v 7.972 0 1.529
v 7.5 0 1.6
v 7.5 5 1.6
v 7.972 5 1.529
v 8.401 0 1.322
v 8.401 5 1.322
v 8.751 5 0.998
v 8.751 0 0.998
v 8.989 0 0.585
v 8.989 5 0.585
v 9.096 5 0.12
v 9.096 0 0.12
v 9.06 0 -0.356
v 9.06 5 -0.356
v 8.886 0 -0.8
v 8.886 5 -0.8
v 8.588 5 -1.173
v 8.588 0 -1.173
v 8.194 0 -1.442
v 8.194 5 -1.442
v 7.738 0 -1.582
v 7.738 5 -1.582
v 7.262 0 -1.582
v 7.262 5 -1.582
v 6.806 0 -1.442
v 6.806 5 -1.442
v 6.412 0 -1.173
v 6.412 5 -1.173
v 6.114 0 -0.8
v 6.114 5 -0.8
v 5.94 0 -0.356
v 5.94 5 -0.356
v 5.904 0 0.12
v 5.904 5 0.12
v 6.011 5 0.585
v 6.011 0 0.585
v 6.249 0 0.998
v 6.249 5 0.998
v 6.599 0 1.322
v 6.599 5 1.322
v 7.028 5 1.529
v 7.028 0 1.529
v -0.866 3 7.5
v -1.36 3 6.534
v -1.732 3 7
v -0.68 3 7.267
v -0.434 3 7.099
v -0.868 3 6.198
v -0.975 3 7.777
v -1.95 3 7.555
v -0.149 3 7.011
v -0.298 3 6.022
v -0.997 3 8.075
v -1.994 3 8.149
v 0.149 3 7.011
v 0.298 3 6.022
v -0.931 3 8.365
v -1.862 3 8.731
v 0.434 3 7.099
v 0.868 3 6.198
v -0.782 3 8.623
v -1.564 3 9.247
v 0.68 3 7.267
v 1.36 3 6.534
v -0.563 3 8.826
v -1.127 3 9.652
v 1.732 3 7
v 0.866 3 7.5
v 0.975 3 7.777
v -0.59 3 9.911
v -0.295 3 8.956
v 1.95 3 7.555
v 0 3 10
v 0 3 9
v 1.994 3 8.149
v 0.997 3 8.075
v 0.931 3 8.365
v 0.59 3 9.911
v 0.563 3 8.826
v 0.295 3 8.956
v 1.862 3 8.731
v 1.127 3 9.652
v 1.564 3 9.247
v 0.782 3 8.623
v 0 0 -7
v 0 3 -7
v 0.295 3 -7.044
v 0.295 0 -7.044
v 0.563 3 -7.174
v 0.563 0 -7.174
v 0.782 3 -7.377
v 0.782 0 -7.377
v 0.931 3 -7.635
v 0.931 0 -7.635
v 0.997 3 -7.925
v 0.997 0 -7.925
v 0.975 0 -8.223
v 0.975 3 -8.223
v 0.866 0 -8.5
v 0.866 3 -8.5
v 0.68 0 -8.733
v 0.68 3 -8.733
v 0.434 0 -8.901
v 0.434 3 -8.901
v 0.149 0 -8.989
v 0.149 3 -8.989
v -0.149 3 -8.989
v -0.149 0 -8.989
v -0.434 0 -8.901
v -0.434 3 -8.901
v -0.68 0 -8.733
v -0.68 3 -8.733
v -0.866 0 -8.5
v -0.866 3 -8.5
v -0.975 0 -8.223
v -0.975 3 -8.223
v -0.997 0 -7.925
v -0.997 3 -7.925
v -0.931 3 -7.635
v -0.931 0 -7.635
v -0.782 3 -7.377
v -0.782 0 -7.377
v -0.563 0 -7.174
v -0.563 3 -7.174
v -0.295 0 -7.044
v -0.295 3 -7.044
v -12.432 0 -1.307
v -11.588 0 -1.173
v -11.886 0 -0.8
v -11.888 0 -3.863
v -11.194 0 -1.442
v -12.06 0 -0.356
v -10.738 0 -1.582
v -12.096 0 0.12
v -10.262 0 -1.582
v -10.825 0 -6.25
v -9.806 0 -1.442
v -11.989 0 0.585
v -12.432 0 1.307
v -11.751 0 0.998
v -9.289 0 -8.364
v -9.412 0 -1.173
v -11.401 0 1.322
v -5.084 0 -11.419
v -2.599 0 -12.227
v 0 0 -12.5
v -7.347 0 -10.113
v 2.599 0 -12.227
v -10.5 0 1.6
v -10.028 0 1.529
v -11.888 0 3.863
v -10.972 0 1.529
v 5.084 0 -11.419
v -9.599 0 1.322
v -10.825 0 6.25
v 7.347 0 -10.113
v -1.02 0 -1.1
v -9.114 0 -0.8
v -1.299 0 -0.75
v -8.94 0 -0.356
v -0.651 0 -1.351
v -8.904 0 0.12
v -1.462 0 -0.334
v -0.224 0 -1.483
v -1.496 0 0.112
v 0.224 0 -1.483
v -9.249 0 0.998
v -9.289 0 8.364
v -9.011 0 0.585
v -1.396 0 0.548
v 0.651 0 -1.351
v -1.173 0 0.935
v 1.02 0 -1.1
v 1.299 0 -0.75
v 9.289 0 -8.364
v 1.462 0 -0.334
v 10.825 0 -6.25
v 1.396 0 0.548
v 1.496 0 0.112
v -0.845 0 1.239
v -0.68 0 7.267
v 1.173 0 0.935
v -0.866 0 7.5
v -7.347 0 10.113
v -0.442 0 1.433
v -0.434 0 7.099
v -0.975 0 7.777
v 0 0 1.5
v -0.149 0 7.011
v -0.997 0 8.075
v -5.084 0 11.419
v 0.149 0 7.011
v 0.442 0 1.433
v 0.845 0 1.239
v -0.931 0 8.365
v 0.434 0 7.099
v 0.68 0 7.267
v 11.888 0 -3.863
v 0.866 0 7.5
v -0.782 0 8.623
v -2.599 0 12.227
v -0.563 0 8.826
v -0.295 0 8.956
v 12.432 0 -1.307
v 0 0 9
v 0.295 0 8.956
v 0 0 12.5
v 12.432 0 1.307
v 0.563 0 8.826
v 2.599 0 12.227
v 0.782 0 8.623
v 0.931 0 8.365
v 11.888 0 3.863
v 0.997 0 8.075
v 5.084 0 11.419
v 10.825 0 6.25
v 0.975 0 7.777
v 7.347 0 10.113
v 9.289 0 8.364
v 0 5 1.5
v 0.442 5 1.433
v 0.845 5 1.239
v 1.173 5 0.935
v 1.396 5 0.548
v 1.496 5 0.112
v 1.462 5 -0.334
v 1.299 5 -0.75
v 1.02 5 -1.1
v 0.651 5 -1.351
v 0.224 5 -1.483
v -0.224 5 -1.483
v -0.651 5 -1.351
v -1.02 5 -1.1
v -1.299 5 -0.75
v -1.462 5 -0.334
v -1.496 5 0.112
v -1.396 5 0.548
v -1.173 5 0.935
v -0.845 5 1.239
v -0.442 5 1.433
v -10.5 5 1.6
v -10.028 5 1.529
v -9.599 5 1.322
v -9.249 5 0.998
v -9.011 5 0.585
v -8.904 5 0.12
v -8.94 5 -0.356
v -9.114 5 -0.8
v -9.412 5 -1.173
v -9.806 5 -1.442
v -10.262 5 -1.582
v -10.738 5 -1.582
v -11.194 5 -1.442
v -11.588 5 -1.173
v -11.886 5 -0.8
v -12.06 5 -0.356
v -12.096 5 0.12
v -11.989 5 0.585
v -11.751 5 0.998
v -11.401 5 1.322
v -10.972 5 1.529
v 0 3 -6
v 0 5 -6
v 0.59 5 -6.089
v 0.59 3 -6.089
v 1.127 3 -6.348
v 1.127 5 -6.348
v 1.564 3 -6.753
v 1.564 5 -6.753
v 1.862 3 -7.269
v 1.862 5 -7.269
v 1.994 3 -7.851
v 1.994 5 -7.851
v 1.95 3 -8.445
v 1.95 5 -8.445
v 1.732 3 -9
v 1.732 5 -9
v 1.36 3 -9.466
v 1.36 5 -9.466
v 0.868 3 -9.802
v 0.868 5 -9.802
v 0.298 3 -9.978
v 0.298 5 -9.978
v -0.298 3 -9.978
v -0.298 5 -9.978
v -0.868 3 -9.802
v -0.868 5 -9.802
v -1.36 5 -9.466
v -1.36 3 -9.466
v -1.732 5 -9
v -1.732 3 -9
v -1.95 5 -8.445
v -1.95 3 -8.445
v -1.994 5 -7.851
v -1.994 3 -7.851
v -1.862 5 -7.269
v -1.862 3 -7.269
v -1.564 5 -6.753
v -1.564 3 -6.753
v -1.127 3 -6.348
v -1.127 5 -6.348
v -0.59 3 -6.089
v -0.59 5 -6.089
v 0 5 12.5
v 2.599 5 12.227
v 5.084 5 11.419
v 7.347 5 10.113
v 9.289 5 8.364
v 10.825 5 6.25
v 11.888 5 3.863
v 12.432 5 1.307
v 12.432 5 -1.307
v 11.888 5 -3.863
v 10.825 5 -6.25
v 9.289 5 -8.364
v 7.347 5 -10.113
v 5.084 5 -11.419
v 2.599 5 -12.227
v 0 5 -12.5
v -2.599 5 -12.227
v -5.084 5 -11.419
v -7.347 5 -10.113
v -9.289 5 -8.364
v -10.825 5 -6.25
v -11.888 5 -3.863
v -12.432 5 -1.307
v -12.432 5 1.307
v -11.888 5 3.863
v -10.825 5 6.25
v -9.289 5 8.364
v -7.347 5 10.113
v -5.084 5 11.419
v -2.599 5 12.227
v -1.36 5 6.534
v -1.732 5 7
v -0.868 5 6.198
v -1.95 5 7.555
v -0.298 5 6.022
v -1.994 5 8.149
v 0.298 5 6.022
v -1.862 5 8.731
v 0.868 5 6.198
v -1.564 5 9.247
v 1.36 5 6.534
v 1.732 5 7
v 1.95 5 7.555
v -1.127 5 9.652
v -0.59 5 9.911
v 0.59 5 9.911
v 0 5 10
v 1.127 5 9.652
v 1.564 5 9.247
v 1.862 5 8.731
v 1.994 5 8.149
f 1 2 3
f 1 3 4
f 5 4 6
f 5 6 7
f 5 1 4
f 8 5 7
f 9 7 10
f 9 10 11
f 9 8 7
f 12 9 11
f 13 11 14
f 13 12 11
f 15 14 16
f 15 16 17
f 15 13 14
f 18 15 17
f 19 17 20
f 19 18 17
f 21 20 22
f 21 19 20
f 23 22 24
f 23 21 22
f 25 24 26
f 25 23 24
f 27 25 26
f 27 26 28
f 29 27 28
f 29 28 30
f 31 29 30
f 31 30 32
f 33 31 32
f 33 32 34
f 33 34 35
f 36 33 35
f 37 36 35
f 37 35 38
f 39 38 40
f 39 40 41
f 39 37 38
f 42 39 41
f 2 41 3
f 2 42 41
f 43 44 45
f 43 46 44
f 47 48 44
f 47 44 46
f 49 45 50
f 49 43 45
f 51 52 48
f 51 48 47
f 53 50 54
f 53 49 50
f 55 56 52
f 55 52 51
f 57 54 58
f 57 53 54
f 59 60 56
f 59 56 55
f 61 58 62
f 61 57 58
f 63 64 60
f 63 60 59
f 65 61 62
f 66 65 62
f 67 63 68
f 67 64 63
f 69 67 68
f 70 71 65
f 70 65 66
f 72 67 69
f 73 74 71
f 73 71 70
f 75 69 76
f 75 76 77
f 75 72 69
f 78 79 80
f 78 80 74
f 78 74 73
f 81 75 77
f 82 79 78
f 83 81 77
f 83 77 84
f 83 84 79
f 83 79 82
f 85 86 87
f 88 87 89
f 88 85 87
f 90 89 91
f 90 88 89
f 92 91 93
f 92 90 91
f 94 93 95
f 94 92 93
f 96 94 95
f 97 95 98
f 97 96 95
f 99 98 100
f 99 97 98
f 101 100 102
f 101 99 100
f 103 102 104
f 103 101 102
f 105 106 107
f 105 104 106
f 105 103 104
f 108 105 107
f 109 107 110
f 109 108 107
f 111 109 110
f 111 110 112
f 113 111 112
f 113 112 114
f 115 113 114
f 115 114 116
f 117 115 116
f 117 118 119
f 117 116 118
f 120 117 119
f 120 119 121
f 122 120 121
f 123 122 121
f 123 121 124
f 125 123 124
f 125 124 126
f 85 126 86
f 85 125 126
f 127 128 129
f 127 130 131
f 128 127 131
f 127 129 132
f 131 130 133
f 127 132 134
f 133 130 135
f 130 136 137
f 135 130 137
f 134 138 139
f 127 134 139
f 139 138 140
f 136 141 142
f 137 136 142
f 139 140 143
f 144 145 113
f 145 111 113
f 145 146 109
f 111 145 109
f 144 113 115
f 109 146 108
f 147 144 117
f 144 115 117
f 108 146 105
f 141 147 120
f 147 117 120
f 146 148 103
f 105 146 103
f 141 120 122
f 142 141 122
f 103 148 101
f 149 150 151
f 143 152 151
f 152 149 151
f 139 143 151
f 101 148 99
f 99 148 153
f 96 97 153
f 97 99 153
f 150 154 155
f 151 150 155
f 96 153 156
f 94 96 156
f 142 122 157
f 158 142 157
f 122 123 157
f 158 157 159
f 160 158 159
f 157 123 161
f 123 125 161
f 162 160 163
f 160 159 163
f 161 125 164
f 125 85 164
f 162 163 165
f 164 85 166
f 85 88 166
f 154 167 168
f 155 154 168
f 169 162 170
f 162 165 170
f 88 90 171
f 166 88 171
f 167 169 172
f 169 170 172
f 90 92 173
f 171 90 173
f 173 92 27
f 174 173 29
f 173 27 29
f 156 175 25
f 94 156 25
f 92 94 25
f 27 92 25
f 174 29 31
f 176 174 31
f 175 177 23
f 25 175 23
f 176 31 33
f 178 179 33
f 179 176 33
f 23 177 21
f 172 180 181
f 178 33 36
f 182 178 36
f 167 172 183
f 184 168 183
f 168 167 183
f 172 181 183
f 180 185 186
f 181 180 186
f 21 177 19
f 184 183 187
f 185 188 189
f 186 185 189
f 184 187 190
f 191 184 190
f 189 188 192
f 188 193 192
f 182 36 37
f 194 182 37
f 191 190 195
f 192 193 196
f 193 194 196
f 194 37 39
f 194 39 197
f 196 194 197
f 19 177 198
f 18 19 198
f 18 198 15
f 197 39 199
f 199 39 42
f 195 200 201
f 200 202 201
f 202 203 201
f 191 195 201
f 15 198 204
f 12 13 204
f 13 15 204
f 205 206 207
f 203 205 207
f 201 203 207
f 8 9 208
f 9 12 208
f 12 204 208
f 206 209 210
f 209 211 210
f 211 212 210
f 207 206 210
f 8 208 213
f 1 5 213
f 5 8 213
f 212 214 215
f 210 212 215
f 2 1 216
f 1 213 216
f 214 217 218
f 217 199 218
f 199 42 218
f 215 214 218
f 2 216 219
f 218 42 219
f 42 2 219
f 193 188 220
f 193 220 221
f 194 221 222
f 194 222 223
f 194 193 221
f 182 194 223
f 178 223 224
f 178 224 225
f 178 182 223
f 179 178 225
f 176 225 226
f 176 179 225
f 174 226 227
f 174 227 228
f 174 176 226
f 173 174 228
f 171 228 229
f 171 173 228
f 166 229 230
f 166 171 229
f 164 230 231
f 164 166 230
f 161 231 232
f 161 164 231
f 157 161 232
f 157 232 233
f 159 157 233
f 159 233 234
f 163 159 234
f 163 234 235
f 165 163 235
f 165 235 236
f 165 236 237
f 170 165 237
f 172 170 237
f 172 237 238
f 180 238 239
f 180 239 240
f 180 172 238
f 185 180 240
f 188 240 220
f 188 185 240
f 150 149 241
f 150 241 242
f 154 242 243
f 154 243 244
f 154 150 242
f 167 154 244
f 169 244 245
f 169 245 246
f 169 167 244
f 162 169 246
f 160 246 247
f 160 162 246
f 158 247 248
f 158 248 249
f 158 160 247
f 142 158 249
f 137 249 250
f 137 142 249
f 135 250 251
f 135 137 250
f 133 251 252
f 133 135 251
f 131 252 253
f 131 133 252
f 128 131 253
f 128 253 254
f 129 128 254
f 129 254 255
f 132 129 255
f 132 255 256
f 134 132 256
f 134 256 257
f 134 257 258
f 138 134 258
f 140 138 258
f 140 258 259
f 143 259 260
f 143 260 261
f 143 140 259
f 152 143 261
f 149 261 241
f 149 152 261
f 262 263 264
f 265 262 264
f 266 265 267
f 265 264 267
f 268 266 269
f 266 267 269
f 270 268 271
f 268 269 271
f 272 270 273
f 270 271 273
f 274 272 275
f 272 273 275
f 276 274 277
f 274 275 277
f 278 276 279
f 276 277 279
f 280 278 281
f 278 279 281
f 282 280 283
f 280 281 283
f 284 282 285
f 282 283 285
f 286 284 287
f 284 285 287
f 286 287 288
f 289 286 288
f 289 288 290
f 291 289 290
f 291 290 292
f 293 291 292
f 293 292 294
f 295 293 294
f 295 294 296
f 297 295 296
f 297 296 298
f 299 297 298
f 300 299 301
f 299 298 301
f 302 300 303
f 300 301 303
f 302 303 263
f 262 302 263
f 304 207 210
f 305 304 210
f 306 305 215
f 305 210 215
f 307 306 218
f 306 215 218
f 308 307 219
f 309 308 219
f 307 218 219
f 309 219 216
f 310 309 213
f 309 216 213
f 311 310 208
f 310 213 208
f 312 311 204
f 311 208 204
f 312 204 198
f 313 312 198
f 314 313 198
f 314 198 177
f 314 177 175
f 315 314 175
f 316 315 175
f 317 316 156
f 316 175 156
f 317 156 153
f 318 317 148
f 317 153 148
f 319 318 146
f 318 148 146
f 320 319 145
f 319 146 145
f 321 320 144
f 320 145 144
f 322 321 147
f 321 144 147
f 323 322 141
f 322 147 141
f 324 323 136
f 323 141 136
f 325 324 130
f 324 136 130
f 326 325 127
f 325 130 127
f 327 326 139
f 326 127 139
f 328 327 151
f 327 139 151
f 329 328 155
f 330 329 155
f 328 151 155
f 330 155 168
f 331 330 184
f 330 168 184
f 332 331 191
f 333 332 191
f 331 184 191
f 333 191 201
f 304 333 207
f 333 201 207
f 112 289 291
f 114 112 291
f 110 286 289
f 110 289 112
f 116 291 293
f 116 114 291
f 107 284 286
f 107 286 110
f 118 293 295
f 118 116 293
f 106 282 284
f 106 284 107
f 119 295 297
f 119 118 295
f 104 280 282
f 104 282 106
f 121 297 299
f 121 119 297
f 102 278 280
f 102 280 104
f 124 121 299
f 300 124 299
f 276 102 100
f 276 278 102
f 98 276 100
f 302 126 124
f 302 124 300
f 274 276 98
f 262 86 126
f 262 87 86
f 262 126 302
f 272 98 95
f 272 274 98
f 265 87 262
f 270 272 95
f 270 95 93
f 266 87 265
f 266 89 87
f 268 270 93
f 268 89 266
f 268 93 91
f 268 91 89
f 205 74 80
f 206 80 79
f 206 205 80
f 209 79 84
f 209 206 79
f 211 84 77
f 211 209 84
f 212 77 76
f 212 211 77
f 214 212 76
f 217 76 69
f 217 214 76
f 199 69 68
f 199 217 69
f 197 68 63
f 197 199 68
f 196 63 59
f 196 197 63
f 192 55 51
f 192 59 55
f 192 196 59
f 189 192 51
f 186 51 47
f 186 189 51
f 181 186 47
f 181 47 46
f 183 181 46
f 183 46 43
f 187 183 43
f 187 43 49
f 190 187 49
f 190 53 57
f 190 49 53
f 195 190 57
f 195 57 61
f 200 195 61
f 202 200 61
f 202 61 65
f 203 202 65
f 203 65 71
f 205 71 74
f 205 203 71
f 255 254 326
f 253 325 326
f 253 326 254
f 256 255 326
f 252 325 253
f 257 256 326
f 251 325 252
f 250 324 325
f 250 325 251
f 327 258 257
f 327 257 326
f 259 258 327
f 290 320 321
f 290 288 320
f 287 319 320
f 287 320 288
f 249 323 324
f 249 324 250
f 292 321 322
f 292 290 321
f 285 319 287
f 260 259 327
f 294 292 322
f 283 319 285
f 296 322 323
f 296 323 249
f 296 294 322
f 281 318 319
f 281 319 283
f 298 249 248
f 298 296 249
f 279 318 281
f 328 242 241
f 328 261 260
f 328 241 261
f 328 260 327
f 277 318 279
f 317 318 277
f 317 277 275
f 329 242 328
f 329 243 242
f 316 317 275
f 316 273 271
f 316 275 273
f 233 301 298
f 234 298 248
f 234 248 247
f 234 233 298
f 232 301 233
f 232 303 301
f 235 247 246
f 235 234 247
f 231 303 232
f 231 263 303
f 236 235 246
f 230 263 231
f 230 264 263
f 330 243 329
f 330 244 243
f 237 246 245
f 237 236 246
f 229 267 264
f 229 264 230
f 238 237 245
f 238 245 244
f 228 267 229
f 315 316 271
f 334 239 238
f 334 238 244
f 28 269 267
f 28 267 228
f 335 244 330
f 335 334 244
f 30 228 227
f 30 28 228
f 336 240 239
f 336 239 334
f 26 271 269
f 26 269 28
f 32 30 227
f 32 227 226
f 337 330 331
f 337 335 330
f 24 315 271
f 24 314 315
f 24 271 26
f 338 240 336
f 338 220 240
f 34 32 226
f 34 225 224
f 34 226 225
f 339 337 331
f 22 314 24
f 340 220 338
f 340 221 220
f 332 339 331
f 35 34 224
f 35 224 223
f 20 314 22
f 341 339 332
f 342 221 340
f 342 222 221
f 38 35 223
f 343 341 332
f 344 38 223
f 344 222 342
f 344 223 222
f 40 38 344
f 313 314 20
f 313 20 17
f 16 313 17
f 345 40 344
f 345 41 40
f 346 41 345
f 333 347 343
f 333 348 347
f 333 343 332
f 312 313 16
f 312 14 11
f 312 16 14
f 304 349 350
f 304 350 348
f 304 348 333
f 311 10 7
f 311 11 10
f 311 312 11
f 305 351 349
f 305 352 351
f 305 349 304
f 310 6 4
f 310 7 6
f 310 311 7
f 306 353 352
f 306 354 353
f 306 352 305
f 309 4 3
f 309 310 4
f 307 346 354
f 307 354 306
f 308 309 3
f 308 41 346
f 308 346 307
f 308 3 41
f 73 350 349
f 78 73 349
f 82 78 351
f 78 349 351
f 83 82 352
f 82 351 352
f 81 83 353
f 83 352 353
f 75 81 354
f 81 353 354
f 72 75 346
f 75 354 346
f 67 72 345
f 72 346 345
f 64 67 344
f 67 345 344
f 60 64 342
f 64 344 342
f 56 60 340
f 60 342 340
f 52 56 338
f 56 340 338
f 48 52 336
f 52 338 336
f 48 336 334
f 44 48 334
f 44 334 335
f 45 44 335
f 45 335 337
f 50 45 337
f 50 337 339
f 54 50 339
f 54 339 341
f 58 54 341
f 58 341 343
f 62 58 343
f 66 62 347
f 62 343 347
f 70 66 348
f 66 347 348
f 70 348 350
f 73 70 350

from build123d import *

# Parameters (mm, degrees)
SKETCH1_R           = 12.5
SKETCH1_R_2         = 1
SKETCH1_R_3         = 1.5
SKETCH1_R_4         = 1.6
BOSS_EXTRUDE1_DEPTH = 5
SKETCH2_R           = 2
CUT_EXTRUDE1_DEPTH  = 2


with BuildPart() as part:
    # Sketch1 → Boss-Extrude1 (new body)
    with BuildSketch(Plane(origin=(0, 0, 0), x_dir=(1, 0, 0), z_dir=(0, 1, 0))):
        with Locations(Location((0, 0, 0), (0, 0, 270))):
            Circle(SKETCH1_R)
        with Locations(Location((0, -8, 0), (0, 0, 270))):
            Circle(SKETCH1_R_2, mode=Mode.SUBTRACT)
        with Locations(Location((0, 8, 0), (0, 0, 270))):
            Circle(SKETCH1_R_2, mode=Mode.SUBTRACT)
        with Locations(Location((0, 0, 0), (0, 0, 270))):
            Circle(SKETCH1_R_3, mode=Mode.SUBTRACT)
        with Locations(Location((-10.5, 0, 0), (0, 0, 270))):
            Circle(SKETCH1_R_4, mode=Mode.SUBTRACT)
        with Locations(Location((7.5, 0, 0), (0, 0, 270))):
            Circle(SKETCH1_R_4, mode=Mode.SUBTRACT)
    extrude(amount=BOSS_EXTRUDE1_DEPTH)

    # Sketch2 → Cut-Extrude1 (cut)
    with BuildSketch(Plane(origin=(0, 5, 0), x_dir=(1, 0, 0), z_dir=(0, 1, 0))):
        with Locations(Location((0, 8, 0), (0, 0, 270))):
            Circle(SKETCH2_R)
        with Locations(Location((0, -8, 0), (0, 0, 270))):
            Circle(SKETCH2_R)
    extrude(amount=-CUT_EXTRUDE1_DEPTH, mode=Mode.SUBTRACT)


solid = part.part
